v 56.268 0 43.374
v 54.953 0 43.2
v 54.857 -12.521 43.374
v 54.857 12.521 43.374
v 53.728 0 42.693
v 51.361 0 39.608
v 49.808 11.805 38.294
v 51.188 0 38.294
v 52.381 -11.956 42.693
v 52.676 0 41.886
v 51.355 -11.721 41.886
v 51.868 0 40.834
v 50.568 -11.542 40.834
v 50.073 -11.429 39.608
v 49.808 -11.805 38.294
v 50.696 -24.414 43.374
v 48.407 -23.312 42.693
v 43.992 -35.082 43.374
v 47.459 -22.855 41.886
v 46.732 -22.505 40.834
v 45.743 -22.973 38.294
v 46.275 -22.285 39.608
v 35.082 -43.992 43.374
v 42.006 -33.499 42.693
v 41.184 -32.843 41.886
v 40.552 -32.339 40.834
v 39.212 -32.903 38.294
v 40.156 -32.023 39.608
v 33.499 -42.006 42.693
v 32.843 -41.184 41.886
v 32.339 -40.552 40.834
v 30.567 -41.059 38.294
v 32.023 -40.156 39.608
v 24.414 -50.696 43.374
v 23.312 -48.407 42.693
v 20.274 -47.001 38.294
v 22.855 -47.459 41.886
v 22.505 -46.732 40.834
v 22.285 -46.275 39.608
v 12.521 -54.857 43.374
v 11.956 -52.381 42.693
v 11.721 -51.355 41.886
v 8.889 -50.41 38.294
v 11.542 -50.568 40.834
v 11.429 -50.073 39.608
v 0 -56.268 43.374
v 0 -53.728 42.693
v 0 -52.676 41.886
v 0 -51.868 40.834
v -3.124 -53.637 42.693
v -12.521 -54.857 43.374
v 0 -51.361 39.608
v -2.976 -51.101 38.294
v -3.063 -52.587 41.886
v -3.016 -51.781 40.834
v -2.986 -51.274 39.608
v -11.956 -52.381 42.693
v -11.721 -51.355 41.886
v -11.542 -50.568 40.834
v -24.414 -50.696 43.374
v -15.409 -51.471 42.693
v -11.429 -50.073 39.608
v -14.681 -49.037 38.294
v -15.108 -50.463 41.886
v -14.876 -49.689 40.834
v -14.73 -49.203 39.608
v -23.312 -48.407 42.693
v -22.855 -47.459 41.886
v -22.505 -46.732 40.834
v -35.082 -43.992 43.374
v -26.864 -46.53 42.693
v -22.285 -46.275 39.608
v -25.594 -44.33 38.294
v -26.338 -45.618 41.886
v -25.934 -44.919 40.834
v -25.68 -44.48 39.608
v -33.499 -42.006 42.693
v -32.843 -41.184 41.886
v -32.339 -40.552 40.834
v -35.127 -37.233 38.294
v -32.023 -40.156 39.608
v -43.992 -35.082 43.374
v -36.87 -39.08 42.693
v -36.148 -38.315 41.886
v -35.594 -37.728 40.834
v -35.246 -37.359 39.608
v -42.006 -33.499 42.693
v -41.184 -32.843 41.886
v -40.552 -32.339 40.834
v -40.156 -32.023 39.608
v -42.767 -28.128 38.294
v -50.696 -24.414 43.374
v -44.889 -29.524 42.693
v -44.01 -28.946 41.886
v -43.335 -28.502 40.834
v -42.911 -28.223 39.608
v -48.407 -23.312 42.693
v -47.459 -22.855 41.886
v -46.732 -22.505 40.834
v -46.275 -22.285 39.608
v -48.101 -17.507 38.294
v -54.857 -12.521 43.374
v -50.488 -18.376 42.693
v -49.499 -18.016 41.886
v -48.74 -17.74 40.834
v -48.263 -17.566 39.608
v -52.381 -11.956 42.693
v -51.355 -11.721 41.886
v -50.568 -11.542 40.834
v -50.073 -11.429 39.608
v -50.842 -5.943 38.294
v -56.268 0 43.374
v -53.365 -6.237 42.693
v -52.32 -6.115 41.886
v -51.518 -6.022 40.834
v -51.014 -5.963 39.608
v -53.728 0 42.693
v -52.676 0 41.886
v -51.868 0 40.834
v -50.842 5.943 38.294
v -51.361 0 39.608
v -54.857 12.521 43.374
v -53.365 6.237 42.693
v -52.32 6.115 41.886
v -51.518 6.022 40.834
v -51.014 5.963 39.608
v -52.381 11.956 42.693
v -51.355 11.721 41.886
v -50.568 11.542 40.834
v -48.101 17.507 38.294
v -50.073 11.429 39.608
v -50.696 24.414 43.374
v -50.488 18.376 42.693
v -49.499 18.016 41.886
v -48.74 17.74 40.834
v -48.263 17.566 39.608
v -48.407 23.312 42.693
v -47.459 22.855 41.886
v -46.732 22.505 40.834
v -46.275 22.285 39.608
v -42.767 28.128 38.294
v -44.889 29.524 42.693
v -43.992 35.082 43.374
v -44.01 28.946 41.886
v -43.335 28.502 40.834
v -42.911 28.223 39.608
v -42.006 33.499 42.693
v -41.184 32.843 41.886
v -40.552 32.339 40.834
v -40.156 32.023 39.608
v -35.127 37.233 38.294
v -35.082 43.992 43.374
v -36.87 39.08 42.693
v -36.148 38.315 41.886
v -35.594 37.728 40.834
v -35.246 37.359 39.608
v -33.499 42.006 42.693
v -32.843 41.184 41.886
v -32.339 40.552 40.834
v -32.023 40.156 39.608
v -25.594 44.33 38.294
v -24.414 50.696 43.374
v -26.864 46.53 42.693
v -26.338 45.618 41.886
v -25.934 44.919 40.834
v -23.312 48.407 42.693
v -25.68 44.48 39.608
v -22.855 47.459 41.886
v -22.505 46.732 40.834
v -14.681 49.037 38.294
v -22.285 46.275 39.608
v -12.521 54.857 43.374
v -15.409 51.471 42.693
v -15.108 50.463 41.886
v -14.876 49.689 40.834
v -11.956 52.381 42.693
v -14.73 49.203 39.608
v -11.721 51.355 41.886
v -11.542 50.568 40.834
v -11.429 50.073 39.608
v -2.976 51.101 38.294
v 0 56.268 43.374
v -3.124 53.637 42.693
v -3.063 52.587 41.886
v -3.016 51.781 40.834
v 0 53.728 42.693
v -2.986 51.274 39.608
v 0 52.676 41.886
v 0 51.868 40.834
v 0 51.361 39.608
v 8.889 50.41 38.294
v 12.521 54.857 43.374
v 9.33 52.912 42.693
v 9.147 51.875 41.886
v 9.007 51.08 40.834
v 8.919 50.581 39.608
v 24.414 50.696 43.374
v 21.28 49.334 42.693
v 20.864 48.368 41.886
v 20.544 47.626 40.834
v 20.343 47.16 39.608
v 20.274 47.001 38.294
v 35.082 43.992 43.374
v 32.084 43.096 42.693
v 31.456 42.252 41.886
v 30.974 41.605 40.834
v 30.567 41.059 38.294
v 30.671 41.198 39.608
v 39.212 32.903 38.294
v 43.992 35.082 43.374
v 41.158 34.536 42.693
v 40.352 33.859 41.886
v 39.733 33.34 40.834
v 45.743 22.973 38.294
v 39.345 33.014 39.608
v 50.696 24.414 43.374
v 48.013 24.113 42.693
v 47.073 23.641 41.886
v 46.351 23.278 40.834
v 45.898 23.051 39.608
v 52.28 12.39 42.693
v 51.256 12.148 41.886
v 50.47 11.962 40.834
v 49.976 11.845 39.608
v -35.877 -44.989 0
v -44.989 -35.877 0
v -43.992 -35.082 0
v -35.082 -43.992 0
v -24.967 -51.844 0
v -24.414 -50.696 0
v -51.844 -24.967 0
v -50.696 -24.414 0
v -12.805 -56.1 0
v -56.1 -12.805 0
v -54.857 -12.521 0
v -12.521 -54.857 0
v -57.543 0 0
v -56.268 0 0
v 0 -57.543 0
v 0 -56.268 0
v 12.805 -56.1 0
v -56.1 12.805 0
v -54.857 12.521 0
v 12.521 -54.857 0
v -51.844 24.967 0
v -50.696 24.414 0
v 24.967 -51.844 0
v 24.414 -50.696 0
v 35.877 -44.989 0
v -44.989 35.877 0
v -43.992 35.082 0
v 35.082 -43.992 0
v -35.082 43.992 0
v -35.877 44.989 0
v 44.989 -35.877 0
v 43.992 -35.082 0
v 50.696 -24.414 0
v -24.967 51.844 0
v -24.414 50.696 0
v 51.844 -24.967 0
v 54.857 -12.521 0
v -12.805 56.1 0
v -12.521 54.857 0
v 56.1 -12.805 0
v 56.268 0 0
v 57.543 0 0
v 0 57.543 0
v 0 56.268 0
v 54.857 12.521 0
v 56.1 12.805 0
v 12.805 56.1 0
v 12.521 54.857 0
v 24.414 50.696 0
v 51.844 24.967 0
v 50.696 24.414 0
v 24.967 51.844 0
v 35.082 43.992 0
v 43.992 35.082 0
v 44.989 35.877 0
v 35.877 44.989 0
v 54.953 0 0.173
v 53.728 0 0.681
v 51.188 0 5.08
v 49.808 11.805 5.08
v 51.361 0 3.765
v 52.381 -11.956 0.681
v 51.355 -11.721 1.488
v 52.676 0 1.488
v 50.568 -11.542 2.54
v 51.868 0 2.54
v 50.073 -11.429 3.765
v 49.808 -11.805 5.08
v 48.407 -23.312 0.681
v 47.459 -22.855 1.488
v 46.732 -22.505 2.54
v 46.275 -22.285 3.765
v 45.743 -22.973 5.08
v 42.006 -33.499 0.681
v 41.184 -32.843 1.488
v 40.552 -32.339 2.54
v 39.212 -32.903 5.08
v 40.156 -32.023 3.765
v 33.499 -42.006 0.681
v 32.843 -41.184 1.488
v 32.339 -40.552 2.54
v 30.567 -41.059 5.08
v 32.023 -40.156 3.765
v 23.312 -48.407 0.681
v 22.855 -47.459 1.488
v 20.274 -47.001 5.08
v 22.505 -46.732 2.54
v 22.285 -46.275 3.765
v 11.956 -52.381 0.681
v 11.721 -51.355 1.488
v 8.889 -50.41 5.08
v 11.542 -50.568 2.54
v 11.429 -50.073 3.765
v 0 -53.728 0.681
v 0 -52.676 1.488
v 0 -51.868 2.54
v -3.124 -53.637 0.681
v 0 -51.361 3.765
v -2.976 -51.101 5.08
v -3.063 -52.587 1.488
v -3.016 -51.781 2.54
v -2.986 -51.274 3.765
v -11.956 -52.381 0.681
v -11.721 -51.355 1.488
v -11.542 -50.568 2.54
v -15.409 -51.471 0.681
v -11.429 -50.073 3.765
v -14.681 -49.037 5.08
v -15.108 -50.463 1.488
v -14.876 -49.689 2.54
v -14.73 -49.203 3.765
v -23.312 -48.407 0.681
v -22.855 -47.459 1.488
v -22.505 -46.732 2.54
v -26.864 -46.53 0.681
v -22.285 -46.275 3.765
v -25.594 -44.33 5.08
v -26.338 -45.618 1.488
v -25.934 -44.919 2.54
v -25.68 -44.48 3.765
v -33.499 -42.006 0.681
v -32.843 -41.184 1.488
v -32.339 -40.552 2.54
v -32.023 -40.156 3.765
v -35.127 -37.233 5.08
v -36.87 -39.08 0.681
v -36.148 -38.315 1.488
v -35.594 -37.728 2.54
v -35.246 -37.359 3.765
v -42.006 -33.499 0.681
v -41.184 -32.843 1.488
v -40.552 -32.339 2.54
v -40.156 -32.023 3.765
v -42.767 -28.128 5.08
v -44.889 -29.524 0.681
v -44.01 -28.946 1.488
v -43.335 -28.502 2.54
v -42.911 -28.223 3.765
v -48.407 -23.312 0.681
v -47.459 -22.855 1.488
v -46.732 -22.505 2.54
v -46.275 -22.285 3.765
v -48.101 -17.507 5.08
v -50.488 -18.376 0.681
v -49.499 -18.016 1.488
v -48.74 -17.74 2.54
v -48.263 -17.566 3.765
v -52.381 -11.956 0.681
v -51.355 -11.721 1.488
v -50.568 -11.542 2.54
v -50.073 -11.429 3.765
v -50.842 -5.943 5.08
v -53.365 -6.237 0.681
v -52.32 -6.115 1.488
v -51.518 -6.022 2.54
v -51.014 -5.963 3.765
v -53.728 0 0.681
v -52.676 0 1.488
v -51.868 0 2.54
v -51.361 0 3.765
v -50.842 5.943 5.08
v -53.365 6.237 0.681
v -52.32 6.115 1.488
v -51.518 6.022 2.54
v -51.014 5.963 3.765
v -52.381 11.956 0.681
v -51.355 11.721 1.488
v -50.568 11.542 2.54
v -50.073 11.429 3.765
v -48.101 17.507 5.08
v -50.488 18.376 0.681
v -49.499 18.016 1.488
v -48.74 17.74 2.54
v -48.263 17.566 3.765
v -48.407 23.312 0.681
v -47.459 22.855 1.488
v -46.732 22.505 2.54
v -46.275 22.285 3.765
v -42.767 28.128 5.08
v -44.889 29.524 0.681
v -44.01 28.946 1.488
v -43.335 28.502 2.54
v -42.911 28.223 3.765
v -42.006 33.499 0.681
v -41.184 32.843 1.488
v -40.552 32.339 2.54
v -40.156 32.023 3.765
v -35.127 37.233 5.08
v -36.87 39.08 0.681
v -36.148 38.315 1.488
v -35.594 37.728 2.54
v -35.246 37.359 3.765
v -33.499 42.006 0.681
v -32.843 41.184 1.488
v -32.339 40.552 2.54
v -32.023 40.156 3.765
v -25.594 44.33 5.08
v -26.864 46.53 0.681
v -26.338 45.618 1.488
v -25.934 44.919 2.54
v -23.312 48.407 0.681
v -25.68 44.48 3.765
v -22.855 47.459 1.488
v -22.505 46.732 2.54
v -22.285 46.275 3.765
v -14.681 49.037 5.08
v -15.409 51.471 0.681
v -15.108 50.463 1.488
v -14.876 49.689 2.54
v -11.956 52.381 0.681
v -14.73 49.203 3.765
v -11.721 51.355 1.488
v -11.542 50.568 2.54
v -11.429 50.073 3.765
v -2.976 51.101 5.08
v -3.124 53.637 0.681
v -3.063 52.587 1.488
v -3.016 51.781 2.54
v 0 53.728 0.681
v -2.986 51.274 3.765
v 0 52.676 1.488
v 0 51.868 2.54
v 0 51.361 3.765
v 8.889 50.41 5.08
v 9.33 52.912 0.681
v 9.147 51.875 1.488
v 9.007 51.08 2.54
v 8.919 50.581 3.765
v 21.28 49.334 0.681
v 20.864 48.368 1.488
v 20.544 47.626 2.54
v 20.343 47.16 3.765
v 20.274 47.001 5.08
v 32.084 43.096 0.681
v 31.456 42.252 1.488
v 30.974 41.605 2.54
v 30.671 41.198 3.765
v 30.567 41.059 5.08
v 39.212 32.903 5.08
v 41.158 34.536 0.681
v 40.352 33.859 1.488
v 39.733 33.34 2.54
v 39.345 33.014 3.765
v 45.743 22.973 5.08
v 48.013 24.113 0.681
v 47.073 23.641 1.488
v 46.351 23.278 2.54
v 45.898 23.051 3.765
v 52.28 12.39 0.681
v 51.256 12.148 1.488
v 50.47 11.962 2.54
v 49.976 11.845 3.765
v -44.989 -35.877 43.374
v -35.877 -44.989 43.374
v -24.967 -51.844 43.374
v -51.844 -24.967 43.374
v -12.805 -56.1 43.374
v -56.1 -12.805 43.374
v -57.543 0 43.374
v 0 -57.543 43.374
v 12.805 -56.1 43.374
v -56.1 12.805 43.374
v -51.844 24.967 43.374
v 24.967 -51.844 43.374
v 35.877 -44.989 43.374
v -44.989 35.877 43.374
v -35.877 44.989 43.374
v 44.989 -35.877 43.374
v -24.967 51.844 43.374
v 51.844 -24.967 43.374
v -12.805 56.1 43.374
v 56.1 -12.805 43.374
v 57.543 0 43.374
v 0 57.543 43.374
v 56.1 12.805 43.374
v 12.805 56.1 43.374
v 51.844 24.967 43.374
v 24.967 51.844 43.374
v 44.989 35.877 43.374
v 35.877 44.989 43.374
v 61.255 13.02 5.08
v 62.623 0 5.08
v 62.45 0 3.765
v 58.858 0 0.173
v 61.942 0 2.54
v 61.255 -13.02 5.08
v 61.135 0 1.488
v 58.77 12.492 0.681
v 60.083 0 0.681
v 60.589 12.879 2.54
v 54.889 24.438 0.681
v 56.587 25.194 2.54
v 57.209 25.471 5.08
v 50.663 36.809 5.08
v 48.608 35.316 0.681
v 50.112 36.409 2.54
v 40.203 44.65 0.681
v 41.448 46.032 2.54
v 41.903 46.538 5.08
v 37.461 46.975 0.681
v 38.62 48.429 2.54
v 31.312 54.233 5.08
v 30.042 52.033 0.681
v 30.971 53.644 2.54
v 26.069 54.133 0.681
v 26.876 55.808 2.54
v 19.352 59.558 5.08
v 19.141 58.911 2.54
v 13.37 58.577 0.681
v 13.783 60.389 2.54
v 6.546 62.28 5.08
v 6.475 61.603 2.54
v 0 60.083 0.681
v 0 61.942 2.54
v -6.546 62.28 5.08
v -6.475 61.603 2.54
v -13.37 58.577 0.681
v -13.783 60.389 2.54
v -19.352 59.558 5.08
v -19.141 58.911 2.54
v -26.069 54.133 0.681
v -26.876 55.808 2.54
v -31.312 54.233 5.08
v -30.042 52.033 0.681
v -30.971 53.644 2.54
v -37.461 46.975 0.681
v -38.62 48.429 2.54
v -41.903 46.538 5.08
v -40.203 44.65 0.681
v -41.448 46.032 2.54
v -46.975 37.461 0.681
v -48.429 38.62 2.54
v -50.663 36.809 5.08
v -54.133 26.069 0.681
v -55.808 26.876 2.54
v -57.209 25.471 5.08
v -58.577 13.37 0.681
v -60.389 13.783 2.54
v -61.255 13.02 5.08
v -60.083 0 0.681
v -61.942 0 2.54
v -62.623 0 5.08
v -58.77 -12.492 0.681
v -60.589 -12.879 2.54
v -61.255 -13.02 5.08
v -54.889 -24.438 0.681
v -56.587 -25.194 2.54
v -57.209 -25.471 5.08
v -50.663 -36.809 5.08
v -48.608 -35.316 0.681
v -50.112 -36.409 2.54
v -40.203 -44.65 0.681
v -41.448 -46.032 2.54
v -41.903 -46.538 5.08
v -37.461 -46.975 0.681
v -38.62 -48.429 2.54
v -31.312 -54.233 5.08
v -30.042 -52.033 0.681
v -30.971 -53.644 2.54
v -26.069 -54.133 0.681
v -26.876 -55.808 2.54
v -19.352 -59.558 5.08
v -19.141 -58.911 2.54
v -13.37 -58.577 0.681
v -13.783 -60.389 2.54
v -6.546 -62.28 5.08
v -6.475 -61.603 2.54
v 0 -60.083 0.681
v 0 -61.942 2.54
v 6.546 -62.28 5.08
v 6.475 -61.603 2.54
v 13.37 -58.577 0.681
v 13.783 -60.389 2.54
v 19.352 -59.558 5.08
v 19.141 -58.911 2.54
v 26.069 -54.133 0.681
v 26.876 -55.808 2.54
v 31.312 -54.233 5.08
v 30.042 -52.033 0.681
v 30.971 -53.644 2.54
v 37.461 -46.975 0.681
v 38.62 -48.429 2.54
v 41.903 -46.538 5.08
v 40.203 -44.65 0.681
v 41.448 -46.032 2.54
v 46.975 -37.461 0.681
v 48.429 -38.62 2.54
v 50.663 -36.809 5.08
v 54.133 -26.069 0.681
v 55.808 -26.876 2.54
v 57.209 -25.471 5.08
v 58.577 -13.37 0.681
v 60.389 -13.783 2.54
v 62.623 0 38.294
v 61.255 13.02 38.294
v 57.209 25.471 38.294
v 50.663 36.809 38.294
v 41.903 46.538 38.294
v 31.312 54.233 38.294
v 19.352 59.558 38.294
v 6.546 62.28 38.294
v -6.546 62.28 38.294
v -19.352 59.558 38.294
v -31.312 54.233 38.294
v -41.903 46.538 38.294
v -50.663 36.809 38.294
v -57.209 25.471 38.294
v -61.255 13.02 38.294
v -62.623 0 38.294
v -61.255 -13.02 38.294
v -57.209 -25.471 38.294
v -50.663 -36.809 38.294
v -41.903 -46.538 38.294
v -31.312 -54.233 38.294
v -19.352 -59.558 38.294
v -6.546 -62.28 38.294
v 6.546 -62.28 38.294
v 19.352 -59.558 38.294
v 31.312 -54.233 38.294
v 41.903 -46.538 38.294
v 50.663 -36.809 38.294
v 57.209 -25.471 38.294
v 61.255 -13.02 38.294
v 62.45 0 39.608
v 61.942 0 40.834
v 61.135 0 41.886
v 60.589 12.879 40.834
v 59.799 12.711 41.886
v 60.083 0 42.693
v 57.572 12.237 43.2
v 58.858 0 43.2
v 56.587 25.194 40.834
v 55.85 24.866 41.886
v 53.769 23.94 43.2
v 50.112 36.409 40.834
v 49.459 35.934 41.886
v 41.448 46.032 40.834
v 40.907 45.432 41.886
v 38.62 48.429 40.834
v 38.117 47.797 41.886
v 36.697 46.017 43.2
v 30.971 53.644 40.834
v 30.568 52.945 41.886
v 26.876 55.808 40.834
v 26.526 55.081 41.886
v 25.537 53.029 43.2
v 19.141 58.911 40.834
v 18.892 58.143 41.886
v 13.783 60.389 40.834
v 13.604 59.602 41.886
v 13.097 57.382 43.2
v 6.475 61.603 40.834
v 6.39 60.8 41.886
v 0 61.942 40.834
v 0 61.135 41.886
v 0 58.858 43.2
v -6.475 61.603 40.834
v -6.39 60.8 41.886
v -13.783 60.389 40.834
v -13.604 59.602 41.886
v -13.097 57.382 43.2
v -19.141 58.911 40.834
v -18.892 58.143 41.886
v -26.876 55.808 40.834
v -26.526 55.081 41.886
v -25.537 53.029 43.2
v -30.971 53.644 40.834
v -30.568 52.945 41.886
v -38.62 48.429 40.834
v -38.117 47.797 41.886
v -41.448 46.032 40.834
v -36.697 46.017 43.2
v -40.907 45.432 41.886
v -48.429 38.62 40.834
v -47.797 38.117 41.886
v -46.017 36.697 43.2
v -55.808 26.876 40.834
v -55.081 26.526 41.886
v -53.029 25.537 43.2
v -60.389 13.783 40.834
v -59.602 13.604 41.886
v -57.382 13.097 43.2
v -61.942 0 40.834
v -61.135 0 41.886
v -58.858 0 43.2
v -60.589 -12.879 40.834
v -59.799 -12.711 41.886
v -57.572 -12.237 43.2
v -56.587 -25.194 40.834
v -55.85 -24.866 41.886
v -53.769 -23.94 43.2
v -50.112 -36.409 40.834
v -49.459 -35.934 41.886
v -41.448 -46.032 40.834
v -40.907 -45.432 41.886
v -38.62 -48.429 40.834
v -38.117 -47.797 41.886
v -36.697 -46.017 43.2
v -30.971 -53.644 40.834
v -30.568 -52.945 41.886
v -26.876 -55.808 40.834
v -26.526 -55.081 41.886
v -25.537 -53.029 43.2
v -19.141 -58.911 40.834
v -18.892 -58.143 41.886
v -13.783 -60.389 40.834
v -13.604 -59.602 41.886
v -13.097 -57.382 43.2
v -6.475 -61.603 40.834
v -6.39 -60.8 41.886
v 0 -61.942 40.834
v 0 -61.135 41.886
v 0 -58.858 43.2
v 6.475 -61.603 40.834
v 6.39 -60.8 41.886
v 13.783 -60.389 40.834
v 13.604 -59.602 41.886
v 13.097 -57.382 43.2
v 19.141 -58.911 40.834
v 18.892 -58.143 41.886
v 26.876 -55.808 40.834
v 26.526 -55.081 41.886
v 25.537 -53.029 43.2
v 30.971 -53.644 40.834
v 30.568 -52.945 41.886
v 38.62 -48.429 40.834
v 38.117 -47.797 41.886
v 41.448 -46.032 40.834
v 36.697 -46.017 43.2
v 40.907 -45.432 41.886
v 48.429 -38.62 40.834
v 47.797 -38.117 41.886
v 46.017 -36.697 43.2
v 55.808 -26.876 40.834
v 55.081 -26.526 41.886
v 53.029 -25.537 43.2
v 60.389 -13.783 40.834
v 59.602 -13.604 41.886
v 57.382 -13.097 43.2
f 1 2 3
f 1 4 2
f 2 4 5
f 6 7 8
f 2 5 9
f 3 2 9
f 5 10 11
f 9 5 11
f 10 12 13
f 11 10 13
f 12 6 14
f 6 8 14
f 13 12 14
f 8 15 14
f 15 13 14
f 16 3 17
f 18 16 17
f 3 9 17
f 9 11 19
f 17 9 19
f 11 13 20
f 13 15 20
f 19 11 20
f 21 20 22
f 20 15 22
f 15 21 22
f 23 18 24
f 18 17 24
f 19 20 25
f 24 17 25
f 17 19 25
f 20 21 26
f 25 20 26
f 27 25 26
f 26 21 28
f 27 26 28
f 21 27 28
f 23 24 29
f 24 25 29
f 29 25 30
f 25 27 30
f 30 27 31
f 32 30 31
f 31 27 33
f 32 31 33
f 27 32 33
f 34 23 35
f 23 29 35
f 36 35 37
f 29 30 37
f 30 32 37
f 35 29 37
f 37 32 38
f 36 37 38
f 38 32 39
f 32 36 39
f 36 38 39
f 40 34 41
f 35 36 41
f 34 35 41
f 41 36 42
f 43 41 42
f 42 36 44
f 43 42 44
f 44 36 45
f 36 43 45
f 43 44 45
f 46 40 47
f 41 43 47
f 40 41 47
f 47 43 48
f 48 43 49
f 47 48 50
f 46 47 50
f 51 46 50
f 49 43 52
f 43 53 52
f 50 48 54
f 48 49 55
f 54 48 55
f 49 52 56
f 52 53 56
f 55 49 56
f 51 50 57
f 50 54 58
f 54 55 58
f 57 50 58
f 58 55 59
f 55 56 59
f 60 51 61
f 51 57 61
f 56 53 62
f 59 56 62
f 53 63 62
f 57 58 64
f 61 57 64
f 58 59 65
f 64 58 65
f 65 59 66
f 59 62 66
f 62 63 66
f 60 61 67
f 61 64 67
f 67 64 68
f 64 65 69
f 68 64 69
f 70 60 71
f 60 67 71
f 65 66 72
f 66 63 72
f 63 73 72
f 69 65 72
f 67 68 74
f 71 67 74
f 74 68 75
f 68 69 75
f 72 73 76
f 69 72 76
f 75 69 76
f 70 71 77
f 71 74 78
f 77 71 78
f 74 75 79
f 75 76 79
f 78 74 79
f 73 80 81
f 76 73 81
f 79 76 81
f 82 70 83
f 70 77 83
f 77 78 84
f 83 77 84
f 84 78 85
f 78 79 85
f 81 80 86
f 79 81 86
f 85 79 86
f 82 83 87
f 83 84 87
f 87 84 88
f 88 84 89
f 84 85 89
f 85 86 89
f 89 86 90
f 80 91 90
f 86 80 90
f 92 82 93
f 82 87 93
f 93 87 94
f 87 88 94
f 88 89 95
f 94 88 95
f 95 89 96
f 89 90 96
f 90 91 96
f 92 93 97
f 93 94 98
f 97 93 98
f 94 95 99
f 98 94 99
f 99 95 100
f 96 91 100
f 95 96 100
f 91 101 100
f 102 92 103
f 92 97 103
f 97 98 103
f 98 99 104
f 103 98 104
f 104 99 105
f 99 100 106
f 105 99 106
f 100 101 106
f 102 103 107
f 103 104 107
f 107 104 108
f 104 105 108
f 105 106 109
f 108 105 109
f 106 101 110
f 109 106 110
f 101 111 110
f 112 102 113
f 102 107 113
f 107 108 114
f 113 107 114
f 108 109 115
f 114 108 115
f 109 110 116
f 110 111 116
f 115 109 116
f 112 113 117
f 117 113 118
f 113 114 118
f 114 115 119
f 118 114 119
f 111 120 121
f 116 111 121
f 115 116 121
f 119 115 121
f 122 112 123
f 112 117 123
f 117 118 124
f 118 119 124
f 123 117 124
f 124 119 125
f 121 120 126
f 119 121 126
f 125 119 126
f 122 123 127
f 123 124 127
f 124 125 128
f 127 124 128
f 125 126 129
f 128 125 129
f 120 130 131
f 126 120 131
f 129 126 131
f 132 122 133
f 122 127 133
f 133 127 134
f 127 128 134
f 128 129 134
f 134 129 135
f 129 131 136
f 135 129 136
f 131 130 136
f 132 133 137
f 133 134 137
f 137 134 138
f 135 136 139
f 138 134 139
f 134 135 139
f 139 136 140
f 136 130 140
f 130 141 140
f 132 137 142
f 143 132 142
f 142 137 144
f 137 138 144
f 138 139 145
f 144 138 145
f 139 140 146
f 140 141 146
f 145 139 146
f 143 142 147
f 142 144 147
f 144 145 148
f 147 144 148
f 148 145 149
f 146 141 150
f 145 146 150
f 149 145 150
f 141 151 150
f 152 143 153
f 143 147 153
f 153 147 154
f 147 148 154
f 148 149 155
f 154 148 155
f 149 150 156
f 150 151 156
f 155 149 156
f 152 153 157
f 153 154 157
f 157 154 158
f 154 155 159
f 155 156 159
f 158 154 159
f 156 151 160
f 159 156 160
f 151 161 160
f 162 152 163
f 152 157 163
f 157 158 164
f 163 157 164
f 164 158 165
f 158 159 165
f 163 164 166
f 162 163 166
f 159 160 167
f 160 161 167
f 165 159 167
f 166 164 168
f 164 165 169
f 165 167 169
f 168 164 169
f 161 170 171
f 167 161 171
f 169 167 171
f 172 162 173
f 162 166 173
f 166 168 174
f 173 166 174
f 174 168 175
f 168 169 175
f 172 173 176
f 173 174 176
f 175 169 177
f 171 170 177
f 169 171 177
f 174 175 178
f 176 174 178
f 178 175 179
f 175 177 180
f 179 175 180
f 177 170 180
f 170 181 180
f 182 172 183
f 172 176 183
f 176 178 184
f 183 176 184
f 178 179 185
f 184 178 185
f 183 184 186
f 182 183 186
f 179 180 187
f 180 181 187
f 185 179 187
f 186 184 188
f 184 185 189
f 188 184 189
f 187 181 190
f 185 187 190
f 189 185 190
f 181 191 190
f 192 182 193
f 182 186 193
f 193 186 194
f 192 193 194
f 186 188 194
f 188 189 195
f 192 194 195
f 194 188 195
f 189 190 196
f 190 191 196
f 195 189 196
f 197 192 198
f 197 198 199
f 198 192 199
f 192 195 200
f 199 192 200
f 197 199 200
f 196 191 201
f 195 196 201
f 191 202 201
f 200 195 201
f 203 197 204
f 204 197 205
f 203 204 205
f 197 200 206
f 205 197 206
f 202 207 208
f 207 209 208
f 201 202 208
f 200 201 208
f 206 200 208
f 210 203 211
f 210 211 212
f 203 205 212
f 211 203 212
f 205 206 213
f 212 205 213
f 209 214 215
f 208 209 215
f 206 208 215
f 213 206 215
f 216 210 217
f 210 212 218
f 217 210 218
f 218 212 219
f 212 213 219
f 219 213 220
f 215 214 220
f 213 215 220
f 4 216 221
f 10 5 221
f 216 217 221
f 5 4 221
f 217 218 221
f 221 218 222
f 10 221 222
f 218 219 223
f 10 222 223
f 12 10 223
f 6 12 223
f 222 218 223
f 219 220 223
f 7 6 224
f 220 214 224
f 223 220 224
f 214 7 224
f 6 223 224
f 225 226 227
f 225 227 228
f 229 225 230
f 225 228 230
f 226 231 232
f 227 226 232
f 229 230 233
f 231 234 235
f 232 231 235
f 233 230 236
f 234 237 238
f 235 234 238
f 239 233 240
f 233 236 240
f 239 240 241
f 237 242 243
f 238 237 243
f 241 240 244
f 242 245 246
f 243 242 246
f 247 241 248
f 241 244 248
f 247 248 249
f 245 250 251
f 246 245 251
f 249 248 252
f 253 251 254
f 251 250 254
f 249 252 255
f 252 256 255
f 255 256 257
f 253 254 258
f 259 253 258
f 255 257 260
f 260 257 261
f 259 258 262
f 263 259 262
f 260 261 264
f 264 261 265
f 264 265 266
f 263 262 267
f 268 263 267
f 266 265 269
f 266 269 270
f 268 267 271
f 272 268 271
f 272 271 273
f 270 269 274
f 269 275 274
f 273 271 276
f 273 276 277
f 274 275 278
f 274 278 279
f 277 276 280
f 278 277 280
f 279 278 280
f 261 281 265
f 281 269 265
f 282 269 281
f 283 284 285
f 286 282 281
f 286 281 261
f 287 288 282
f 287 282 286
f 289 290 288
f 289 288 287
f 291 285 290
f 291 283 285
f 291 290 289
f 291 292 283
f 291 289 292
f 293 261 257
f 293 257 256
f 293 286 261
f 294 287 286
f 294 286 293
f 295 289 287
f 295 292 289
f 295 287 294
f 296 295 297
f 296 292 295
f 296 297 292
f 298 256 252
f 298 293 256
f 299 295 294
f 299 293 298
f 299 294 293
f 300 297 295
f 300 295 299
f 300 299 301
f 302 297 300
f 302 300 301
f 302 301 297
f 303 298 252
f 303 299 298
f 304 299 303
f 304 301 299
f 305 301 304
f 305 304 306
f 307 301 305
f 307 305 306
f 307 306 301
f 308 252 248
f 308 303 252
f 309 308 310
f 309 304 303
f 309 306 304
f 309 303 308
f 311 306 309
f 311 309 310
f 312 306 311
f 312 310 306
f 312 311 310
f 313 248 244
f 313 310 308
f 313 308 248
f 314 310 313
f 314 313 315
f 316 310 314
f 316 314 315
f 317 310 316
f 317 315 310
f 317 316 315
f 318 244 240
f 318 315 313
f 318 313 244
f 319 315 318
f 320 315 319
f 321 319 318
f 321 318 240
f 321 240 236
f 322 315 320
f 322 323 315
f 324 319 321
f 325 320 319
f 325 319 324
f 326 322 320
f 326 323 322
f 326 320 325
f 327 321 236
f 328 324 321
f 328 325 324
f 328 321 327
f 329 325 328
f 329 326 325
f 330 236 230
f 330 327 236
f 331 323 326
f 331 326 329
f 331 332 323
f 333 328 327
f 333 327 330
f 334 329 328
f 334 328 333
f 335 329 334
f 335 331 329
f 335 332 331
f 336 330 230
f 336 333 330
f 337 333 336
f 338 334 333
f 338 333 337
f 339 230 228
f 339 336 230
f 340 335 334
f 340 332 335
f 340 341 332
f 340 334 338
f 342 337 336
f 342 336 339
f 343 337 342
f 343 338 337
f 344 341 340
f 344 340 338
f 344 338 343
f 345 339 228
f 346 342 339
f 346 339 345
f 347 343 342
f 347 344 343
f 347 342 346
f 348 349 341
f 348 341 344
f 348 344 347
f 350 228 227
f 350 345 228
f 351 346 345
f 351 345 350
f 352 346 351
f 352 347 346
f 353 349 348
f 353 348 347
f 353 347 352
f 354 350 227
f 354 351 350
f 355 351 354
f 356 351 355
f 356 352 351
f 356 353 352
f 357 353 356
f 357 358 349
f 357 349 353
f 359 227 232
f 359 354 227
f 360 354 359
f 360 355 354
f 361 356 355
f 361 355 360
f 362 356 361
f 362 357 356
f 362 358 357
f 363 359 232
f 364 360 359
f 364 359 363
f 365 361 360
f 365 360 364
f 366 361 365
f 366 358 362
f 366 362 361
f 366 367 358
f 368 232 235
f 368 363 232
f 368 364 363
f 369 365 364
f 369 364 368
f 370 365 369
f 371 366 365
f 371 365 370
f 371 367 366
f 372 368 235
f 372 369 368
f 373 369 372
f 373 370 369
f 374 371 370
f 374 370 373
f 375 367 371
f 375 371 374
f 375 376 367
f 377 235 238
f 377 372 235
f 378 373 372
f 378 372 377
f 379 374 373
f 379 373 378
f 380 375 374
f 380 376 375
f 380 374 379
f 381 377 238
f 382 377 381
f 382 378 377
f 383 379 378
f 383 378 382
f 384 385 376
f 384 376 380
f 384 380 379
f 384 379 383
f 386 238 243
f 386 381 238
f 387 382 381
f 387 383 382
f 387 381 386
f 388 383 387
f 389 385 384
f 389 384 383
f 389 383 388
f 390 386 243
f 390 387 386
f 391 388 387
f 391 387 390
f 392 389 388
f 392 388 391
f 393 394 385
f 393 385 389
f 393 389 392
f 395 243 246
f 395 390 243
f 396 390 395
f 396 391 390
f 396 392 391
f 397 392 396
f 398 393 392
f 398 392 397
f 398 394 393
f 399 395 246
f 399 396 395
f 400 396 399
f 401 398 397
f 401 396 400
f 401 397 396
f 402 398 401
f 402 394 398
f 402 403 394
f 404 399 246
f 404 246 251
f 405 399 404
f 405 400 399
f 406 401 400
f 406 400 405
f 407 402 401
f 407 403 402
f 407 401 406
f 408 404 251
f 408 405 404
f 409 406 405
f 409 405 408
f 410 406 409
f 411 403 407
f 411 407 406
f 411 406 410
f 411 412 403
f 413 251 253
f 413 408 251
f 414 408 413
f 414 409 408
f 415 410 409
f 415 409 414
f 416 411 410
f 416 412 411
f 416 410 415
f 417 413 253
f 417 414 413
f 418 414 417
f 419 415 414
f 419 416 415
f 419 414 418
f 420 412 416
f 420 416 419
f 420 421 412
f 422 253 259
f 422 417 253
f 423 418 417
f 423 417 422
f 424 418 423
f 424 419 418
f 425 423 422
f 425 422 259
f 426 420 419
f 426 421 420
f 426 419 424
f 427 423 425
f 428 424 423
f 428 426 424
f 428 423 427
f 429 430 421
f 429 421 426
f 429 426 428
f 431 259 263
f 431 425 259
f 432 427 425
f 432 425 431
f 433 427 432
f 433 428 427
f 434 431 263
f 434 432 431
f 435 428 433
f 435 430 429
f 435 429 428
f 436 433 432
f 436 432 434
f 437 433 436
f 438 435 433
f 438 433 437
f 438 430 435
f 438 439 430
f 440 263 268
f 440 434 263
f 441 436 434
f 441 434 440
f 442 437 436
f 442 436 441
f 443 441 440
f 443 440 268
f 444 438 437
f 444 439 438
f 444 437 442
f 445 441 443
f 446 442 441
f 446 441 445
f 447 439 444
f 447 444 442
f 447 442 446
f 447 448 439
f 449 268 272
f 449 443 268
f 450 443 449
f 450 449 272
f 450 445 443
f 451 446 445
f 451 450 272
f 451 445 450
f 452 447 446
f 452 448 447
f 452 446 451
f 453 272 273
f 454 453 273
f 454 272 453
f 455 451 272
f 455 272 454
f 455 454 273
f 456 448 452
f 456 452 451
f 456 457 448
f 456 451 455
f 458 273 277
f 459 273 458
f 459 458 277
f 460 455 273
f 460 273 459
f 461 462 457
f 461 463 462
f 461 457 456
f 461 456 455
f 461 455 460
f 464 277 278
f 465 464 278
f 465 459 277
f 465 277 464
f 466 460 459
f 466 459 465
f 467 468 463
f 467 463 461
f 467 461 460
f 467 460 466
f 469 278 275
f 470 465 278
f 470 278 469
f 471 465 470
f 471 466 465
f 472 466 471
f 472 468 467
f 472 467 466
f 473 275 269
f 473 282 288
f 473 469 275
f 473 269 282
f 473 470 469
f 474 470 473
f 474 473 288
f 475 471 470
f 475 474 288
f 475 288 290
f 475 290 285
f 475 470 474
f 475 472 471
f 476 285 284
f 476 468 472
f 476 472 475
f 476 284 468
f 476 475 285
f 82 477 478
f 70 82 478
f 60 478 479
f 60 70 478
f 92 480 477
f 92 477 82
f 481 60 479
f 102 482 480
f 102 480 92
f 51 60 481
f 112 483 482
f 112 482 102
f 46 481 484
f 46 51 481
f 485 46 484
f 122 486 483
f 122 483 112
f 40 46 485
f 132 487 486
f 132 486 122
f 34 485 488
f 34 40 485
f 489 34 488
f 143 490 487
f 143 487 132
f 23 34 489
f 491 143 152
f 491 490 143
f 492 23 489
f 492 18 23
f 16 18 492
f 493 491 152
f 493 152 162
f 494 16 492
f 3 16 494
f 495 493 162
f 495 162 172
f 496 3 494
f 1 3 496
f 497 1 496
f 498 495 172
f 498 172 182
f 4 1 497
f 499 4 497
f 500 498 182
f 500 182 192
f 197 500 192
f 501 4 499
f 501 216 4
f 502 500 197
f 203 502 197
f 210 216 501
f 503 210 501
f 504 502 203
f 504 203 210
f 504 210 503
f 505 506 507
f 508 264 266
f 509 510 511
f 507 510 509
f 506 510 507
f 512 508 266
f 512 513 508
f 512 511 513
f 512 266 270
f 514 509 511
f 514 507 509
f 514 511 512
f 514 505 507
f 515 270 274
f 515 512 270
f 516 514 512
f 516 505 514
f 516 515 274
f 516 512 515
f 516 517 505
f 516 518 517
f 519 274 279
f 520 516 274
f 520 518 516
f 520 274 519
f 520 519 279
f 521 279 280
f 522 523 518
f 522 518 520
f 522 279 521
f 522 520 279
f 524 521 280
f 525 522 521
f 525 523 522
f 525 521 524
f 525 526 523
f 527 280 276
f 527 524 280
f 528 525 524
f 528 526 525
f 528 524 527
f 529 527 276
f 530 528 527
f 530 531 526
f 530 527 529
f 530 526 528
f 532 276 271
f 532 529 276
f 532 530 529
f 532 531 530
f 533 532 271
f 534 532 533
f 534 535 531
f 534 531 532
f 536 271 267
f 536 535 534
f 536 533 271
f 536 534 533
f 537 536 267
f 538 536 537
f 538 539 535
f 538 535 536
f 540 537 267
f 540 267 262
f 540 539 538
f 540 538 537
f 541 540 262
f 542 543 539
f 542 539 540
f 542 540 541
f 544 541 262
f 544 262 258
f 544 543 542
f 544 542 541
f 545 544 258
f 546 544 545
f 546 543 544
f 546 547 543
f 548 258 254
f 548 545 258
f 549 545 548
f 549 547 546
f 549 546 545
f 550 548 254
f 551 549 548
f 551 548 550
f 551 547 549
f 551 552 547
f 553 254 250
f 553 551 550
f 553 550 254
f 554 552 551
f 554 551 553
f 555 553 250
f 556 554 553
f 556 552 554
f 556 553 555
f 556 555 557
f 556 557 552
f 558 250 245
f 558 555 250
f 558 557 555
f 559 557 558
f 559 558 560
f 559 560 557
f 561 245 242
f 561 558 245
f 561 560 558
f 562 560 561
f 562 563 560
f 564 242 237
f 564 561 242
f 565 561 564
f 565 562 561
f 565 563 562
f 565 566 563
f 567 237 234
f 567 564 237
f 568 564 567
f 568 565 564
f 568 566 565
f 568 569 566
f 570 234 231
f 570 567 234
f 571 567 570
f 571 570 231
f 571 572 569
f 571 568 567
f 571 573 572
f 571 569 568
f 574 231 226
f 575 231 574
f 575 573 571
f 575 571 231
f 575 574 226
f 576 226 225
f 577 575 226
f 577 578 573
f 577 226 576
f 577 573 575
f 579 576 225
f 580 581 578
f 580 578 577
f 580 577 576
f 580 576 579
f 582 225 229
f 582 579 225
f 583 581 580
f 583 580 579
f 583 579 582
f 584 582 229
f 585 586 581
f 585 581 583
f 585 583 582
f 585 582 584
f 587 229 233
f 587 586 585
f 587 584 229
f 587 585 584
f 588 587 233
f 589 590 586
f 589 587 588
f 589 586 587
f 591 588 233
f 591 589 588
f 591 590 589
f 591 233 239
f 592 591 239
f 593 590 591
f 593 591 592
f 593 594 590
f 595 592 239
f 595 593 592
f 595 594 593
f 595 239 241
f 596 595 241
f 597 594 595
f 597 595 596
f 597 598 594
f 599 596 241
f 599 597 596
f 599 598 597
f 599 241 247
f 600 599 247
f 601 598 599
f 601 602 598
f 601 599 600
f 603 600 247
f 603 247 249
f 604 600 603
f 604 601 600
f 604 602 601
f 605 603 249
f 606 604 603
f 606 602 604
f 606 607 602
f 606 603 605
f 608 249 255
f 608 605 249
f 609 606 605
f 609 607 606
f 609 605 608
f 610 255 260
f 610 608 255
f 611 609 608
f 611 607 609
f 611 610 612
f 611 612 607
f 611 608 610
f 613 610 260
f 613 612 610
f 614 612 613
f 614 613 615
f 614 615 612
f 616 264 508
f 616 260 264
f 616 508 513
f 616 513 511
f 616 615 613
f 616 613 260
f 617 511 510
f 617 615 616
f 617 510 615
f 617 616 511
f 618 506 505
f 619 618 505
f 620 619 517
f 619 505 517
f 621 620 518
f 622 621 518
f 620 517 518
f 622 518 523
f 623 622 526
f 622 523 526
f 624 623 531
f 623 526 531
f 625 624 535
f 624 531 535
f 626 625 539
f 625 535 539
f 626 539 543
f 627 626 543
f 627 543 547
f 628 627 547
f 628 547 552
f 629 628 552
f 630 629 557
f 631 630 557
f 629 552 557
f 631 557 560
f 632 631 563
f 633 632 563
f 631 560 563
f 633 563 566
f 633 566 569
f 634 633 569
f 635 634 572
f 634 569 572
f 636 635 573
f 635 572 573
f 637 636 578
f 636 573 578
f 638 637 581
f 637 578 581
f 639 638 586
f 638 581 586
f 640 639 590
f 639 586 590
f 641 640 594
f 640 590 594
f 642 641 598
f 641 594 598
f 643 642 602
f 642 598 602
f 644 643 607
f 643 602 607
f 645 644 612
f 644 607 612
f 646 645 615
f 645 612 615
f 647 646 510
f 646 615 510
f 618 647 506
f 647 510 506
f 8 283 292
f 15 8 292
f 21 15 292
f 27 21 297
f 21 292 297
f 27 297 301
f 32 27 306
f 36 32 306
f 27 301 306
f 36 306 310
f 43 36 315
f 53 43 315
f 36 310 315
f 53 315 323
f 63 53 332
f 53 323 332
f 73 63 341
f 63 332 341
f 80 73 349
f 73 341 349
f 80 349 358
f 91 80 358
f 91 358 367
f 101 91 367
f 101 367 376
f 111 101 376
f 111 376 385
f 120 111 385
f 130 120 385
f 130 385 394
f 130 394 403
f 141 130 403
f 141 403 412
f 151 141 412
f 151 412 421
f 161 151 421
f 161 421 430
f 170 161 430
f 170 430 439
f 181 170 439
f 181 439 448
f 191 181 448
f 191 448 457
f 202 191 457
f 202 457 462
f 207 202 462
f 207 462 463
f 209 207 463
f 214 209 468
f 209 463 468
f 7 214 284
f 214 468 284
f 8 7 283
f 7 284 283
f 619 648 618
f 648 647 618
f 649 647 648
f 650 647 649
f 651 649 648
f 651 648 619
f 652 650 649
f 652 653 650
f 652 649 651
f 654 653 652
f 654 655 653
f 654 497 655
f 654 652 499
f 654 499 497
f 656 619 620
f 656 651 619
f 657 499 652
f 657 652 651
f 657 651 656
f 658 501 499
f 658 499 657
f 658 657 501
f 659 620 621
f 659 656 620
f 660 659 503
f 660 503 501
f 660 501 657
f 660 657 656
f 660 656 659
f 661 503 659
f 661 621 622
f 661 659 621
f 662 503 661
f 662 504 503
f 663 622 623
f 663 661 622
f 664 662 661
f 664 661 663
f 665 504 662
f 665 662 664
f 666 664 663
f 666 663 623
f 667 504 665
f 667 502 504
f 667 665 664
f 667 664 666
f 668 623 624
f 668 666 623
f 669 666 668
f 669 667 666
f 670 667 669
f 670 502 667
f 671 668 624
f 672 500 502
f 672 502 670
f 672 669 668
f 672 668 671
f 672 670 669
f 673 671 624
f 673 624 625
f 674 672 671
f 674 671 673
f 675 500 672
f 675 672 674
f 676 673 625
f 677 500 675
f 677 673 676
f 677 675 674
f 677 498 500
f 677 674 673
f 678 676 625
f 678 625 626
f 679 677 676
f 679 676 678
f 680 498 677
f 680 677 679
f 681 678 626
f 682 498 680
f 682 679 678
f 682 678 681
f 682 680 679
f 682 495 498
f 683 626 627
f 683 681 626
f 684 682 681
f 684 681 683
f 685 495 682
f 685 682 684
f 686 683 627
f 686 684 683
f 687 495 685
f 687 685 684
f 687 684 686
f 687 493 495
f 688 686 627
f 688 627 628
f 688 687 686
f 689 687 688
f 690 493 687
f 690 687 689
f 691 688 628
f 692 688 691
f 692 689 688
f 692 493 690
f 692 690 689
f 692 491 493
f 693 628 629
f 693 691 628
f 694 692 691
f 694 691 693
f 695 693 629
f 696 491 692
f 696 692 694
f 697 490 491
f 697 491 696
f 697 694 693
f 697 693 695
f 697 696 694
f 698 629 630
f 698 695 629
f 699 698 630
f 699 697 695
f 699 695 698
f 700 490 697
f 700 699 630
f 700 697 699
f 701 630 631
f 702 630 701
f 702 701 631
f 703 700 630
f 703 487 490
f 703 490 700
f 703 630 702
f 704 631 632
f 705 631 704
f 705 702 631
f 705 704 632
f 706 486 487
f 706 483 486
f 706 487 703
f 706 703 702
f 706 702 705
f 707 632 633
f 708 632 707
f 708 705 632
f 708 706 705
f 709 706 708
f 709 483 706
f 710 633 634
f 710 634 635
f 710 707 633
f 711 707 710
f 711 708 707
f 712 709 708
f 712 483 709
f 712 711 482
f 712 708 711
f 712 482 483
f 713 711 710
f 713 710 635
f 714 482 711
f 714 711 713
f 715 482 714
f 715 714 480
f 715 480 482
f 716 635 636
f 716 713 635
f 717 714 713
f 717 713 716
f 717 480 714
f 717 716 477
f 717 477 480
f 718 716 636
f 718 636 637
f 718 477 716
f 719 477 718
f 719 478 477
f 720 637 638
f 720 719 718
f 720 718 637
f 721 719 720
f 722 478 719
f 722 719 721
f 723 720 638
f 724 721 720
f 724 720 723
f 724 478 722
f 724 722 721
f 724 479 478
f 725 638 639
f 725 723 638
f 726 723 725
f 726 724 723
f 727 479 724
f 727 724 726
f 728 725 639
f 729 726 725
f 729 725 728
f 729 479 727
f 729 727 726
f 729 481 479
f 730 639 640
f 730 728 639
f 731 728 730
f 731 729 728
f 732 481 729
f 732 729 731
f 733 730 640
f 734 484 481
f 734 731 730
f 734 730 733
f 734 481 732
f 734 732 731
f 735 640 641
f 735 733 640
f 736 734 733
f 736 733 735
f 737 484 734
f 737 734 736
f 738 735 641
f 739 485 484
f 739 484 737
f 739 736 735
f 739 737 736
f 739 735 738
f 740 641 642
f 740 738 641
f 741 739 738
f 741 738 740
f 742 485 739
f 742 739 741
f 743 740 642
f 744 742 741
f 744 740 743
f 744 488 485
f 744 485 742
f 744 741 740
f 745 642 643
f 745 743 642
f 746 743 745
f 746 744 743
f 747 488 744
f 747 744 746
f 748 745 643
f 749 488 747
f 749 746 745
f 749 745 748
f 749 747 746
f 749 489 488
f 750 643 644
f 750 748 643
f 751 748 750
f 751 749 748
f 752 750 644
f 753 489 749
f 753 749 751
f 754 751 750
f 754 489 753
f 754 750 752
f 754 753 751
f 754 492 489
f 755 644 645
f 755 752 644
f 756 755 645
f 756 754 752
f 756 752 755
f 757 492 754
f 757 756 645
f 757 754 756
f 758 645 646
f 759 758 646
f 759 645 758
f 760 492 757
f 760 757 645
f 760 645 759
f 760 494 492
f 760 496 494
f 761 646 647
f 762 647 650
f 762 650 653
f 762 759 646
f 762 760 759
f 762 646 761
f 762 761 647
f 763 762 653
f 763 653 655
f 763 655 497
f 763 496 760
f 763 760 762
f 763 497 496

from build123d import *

# Parameters (mm, degrees)
F0_R     = 62.62304
F1_DEPTH = 43.373577
F2_R     = 53.368625
F3_DEPTH = 5.646907
F4_R     = 51.187799
F5_DEPTH = 64.743372
F6_R     = 5.08
F7_R     = 5.08
F8_R     = 5.08


with BuildPart() as f1:
    # F0 (on Top) → F1 (new body)
    with BuildSketch(Plane.XY):
        Circle(F0_R)
    extrude(amount=F1_DEPTH)

    # F2 (on face) → F3 (join)
    with BuildSketch(Plane(origin=(0, 0, 0), x_dir=(1, 0, 0), z_dir=(0, 0, -1))):
        Circle(F2_R)
    extrude(amount=-F3_DEPTH)

    # F4 (on face) → F5 (cut)
    with BuildSketch(Plane(origin=(0, 0, 0), x_dir=(1, 0, 0), z_dir=(0, 0, -1))):
        Circle(F4_R)
    extrude(amount=-F5_DEPTH, mode=Mode.SUBTRACT)

    # F6
    f6_edges = [f1.edges().sort_by_distance(p)[0] for p in [
        (-62.62304, 0, 43.373577),
    ]]
    fillet(f6_edges, radius=F6_R)

    # F7
    f7_edges = [f1.edges().sort_by_distance(p)[0] for p in [
        (-51.187799, 0, 0),
        (-51.187799, 0, 43.373577),
    ]]
    fillet(f7_edges, radius=F7_R)

    # F8
    f8_edges = [f1.edges().sort_by_distance(p)[0] for p in [
        (-62.62304, 0, 0),
    ]]
    fillet(f8_edges, radius=F8_R)


solid = f1.part
